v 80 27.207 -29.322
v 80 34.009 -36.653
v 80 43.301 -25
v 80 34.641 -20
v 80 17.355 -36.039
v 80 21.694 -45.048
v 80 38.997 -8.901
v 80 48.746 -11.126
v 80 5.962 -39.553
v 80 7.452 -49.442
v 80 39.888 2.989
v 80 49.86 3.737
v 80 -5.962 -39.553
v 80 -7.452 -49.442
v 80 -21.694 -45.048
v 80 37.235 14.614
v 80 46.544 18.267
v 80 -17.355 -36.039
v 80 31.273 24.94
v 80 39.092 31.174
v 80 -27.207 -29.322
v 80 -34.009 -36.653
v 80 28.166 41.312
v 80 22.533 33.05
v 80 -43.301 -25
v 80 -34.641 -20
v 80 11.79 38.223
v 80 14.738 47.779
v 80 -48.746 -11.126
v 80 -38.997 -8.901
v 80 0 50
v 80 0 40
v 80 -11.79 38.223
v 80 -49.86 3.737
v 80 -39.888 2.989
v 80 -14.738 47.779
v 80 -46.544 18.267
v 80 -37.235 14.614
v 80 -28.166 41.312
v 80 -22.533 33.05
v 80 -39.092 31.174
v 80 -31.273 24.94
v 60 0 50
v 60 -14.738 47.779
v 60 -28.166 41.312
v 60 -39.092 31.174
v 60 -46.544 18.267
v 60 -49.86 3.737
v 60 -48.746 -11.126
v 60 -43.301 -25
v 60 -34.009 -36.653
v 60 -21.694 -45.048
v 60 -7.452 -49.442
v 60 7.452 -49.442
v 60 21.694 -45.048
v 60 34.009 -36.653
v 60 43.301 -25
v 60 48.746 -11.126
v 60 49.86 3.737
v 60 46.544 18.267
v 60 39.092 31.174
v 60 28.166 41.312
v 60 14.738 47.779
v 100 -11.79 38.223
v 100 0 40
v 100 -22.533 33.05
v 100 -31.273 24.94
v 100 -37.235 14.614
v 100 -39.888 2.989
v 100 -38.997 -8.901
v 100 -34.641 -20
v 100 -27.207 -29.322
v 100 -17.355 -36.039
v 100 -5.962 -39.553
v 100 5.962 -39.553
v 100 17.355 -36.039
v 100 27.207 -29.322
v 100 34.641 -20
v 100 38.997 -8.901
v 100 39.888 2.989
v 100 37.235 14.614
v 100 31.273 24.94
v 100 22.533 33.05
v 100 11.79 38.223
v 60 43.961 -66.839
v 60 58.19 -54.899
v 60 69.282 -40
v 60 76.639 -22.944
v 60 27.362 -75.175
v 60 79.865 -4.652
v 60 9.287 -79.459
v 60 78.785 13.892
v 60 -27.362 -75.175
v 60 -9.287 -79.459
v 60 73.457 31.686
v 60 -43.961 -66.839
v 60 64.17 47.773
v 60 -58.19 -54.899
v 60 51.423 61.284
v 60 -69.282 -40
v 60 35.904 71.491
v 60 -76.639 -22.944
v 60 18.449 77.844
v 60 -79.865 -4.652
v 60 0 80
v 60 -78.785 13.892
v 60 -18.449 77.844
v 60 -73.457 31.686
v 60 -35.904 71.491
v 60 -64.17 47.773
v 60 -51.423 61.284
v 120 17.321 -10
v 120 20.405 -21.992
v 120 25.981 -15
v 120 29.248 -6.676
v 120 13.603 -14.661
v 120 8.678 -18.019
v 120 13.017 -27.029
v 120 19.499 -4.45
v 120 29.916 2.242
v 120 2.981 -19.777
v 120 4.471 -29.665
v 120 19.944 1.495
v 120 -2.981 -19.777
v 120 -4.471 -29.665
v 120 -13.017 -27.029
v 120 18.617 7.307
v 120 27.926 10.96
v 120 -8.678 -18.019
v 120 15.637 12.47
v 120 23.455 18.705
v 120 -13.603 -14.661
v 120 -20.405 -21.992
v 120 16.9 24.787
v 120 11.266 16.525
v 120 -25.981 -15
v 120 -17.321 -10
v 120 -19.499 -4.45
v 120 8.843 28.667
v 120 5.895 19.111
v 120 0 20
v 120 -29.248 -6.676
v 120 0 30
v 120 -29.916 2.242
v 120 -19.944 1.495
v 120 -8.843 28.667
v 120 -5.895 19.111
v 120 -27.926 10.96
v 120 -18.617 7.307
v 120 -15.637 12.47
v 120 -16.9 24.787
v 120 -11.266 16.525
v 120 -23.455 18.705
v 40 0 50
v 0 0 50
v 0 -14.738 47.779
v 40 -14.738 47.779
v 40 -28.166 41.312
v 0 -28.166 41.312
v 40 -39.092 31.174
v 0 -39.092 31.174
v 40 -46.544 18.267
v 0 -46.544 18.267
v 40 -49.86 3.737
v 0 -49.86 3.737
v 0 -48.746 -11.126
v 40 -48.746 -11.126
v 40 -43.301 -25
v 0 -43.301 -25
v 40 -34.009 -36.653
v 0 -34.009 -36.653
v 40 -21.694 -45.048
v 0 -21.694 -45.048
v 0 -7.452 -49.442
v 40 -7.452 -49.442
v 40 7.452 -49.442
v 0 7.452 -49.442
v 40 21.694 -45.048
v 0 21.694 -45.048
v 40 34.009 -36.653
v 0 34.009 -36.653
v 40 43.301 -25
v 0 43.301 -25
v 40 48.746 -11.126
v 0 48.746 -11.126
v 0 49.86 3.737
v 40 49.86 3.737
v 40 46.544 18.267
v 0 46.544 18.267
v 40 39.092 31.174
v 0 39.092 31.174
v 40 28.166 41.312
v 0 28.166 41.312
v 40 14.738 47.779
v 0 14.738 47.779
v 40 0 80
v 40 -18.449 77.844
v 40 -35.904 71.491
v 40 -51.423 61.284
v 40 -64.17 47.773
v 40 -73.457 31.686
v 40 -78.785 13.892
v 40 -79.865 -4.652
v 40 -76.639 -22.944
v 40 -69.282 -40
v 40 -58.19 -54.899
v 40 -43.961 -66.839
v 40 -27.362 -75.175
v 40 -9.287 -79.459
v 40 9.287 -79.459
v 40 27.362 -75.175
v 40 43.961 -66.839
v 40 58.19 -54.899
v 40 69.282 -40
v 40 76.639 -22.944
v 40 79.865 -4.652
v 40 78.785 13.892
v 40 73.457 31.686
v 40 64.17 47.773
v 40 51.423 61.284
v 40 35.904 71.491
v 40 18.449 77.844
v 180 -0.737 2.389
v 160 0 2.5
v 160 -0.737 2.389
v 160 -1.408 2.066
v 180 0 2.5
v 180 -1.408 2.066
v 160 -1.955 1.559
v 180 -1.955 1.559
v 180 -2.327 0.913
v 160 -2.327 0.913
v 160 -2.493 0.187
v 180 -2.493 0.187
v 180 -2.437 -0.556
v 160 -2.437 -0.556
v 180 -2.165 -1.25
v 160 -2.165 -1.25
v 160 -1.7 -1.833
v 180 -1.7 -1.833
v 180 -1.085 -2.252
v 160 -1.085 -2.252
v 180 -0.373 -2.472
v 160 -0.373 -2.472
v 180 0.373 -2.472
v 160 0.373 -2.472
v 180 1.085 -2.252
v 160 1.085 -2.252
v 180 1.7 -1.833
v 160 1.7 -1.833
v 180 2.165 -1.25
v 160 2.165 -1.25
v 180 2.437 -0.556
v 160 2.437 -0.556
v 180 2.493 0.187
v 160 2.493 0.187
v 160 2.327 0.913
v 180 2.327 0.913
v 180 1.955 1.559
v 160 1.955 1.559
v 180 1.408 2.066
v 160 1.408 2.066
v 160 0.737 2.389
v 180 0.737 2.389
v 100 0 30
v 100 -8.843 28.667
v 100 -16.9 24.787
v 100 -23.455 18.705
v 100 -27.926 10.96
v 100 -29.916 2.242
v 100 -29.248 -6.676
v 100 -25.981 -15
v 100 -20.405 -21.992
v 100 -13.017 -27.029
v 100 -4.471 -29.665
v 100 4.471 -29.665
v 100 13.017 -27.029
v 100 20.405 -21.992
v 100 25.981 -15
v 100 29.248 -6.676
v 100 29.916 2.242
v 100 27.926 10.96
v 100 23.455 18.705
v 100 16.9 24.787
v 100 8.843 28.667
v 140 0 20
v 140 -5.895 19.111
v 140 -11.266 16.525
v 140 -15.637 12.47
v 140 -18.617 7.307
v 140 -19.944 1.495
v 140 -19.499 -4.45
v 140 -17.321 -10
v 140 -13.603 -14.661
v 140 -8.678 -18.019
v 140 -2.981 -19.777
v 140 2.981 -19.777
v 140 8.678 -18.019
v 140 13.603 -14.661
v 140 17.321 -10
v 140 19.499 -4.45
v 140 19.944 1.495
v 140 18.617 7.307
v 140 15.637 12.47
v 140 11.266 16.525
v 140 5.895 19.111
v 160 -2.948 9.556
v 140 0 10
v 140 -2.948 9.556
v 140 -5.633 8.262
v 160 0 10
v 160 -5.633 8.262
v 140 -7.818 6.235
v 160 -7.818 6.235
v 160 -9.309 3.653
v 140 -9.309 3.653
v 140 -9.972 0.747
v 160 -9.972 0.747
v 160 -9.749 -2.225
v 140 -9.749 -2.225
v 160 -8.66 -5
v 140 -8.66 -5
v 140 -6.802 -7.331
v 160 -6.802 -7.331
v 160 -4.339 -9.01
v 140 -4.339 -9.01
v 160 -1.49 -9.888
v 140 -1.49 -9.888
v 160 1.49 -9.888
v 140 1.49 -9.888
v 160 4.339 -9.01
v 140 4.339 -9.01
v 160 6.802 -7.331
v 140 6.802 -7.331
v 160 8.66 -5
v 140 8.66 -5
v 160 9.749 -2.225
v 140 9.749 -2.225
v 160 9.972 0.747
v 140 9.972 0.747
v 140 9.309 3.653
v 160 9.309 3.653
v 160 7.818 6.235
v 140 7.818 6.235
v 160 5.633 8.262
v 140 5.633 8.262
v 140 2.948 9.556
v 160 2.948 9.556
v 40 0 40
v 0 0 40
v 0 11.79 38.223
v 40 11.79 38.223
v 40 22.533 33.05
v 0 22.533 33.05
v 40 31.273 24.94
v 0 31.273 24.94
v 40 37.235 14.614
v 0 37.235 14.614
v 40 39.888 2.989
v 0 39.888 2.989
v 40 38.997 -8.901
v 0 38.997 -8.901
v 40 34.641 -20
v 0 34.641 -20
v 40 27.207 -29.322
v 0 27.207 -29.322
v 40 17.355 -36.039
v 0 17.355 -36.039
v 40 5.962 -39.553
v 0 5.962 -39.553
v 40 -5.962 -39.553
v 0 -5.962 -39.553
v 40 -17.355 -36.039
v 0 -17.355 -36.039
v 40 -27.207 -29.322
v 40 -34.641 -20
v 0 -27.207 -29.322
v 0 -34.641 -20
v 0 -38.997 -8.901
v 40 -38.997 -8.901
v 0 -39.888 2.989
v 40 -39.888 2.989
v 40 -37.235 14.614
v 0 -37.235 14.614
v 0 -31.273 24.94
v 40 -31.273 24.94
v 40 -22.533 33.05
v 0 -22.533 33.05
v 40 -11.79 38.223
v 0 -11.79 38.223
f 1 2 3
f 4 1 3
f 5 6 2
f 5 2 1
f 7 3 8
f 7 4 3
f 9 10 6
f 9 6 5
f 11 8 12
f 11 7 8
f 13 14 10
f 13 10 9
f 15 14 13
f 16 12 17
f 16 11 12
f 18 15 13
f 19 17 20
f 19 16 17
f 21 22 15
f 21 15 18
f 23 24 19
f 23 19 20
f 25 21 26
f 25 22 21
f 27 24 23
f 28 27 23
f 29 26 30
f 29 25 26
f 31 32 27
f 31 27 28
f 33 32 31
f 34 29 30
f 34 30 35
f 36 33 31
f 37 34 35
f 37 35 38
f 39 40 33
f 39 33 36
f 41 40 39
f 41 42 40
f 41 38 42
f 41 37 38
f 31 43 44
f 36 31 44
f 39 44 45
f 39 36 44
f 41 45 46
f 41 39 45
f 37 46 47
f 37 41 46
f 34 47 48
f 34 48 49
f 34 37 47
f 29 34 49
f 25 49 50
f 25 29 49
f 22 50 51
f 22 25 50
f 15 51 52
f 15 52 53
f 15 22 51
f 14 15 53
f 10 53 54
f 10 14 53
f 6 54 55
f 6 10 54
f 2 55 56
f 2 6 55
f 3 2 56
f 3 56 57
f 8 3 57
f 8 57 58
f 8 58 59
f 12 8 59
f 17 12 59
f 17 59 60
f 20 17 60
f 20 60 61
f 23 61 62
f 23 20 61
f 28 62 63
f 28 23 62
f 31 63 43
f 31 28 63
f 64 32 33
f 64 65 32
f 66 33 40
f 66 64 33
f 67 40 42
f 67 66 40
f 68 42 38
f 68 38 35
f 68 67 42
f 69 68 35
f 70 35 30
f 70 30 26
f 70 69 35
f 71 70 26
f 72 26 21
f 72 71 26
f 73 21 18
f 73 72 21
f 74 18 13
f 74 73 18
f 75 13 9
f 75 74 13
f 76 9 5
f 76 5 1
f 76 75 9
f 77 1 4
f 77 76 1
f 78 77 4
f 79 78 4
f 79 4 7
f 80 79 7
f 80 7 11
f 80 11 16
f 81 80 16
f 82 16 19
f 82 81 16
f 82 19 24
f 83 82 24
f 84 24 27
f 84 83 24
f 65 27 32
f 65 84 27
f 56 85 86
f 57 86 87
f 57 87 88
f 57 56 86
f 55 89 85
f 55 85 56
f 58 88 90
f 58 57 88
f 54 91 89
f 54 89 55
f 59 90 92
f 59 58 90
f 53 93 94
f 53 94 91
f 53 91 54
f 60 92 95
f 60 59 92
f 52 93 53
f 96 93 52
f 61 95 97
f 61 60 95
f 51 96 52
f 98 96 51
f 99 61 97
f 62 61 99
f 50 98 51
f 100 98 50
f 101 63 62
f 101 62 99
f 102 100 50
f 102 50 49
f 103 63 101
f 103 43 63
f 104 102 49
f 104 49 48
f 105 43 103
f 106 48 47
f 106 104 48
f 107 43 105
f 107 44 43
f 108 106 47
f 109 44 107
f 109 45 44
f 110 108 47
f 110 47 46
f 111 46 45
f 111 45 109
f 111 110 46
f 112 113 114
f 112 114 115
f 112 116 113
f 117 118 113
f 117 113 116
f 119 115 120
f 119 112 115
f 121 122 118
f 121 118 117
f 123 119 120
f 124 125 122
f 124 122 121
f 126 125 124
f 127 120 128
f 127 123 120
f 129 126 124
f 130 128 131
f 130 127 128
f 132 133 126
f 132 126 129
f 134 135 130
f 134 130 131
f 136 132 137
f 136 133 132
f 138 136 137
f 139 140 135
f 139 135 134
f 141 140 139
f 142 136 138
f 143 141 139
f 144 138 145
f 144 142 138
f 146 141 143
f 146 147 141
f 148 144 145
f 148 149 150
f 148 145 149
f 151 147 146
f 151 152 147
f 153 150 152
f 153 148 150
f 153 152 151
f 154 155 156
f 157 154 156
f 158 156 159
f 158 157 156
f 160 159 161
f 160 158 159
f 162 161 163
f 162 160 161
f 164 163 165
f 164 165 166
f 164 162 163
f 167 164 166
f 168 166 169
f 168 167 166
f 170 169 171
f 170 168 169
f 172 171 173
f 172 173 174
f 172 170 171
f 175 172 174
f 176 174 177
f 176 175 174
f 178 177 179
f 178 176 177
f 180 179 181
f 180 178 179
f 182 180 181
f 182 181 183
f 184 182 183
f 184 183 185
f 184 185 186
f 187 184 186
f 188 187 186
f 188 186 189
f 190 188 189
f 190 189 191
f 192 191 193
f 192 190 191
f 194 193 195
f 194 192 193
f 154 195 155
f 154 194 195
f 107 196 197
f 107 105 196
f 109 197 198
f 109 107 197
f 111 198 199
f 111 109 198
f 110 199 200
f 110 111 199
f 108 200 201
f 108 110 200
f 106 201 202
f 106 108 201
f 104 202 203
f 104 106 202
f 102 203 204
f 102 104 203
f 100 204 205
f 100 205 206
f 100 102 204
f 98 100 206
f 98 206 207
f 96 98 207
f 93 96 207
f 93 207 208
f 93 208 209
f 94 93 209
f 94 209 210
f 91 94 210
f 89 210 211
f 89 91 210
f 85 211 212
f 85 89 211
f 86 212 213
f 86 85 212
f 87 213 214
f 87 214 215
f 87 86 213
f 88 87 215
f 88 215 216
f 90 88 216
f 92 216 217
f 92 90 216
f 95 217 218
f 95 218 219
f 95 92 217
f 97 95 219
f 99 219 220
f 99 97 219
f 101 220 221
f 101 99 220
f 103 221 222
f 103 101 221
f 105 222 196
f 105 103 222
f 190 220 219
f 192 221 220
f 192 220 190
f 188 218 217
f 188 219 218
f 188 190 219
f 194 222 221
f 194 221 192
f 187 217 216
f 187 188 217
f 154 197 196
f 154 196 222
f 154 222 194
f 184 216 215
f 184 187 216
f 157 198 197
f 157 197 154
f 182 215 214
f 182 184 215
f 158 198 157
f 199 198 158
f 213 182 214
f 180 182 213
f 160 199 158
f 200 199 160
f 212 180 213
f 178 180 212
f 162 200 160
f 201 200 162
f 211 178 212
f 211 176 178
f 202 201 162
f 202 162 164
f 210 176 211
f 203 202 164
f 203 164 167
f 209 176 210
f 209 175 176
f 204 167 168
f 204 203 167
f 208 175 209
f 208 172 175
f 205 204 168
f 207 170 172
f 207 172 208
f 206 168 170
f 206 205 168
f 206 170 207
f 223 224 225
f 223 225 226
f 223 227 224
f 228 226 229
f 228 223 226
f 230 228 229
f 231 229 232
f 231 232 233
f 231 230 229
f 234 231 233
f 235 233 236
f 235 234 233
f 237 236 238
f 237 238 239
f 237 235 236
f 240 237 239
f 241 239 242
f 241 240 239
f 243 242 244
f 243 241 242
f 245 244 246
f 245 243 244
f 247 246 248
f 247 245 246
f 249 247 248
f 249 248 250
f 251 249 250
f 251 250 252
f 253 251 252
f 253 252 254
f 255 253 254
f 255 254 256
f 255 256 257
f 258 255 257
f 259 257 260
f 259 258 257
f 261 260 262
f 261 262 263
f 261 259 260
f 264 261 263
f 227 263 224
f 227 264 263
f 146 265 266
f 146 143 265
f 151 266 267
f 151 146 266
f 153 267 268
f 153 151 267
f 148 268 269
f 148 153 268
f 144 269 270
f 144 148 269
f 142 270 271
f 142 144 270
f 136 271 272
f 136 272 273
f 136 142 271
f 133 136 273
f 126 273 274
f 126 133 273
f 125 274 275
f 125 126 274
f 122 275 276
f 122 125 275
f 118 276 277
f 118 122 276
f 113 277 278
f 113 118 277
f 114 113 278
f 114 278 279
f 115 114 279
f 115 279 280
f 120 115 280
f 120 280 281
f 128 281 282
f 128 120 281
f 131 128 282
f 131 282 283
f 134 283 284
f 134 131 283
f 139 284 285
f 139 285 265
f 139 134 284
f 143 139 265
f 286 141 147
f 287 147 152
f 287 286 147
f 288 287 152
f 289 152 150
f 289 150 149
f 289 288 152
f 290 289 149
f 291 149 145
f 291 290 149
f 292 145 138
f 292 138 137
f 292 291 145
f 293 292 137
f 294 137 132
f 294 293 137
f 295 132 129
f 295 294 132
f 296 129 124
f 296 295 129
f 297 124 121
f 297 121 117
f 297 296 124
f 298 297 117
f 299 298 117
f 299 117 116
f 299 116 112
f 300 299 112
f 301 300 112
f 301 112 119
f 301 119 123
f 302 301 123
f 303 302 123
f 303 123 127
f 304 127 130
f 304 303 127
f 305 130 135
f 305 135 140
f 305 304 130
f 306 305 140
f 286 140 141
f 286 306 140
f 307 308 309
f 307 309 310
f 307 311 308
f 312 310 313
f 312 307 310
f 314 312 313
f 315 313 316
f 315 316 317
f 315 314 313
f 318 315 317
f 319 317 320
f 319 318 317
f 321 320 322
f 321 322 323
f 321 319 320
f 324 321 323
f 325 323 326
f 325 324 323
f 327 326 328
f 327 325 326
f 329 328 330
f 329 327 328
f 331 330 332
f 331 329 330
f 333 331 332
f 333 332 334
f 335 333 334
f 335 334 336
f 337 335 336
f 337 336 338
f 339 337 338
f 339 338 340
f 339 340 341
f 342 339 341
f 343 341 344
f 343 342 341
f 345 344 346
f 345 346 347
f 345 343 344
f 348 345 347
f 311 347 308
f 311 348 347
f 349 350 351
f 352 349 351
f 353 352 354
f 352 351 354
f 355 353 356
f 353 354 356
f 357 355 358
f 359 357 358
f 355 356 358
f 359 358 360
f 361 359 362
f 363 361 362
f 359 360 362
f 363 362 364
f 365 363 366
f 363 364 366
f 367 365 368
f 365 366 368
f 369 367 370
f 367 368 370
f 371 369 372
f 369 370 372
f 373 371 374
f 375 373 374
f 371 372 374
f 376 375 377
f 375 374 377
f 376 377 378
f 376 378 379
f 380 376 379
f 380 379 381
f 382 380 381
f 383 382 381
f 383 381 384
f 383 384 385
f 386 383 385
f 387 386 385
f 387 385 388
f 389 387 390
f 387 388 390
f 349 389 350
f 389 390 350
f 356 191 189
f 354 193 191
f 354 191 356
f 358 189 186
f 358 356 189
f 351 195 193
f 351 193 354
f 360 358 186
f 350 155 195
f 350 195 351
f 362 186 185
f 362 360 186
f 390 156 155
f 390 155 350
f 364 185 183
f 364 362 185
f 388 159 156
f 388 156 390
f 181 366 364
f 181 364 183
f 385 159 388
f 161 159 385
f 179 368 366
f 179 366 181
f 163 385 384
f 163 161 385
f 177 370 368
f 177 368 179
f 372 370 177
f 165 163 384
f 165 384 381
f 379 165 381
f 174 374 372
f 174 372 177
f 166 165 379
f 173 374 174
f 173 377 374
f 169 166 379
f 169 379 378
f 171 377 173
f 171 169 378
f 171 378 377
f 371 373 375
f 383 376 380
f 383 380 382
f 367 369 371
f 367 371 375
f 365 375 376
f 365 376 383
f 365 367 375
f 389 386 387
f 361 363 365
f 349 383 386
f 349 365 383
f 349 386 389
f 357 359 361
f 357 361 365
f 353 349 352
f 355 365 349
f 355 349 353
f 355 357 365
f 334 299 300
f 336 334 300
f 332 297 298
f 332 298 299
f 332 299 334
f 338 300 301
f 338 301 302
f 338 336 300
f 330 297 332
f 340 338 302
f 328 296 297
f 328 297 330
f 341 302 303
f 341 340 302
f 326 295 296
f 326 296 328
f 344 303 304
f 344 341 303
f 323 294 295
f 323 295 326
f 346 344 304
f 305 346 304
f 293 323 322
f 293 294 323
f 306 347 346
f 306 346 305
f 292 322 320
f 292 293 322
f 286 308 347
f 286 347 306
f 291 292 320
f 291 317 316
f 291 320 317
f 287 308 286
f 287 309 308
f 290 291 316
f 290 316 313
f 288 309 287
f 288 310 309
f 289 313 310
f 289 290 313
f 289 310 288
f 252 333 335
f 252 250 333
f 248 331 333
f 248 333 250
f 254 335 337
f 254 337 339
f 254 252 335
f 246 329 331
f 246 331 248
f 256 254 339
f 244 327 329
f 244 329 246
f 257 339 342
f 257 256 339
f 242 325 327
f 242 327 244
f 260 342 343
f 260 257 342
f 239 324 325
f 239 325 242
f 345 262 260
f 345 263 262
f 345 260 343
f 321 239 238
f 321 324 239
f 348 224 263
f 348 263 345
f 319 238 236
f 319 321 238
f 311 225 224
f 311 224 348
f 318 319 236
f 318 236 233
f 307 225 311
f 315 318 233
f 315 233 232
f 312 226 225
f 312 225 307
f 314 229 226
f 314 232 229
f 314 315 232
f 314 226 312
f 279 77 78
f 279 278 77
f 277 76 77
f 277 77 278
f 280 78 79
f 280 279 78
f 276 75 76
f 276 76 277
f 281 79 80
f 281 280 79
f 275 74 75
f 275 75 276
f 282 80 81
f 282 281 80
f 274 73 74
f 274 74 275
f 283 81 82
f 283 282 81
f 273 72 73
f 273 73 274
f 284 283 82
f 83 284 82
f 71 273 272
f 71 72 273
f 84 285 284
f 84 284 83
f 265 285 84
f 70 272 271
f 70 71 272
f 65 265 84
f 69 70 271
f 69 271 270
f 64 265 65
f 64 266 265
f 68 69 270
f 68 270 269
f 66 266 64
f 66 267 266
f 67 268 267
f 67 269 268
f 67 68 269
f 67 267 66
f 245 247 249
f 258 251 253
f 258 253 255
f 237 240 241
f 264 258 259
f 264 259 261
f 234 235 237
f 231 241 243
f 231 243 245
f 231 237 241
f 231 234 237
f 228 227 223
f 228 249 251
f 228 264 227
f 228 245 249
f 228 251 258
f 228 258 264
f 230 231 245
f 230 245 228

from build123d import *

# Parameters (mm, degrees)
SKETCH8_R          = 40
CUT_EXTRUDE3_DEPTH = 40


with BuildPart() as part:
    # Sketch2 → Revolve4 (revolve)
    with BuildSketch(Plane.XY, mode=Mode.PRIVATE) as revolve4_sk:
        Polygon((40, 50), (40, 80), (60, 80), (60, 50), (80, 50), (80, 40), (100, 40), (100, 30), (120, 30), (120, 20), (140, 20), (140, 10), (160, 10), (160, 2.5), (180, 2.5), (180, 0), (0, 0), (0, 50), align=None)
    revolve(revolve4_sk.sketch.rotate(Axis((-106.966820462, 0, 0), (1, 0, 0)), 90), axis=Axis((-106.966820462, 0, 0), (1, 0, 0)))  # turned: the seam where the file's is

    # Sketch8 → Cut-Extrude3 (cut)
    with BuildSketch(Plane.ZY):
        Circle(SKETCH8_R)
    extrude(amount=-CUT_EXTRUDE3_DEPTH, mode=Mode.SUBTRACT)


solid = part.part
